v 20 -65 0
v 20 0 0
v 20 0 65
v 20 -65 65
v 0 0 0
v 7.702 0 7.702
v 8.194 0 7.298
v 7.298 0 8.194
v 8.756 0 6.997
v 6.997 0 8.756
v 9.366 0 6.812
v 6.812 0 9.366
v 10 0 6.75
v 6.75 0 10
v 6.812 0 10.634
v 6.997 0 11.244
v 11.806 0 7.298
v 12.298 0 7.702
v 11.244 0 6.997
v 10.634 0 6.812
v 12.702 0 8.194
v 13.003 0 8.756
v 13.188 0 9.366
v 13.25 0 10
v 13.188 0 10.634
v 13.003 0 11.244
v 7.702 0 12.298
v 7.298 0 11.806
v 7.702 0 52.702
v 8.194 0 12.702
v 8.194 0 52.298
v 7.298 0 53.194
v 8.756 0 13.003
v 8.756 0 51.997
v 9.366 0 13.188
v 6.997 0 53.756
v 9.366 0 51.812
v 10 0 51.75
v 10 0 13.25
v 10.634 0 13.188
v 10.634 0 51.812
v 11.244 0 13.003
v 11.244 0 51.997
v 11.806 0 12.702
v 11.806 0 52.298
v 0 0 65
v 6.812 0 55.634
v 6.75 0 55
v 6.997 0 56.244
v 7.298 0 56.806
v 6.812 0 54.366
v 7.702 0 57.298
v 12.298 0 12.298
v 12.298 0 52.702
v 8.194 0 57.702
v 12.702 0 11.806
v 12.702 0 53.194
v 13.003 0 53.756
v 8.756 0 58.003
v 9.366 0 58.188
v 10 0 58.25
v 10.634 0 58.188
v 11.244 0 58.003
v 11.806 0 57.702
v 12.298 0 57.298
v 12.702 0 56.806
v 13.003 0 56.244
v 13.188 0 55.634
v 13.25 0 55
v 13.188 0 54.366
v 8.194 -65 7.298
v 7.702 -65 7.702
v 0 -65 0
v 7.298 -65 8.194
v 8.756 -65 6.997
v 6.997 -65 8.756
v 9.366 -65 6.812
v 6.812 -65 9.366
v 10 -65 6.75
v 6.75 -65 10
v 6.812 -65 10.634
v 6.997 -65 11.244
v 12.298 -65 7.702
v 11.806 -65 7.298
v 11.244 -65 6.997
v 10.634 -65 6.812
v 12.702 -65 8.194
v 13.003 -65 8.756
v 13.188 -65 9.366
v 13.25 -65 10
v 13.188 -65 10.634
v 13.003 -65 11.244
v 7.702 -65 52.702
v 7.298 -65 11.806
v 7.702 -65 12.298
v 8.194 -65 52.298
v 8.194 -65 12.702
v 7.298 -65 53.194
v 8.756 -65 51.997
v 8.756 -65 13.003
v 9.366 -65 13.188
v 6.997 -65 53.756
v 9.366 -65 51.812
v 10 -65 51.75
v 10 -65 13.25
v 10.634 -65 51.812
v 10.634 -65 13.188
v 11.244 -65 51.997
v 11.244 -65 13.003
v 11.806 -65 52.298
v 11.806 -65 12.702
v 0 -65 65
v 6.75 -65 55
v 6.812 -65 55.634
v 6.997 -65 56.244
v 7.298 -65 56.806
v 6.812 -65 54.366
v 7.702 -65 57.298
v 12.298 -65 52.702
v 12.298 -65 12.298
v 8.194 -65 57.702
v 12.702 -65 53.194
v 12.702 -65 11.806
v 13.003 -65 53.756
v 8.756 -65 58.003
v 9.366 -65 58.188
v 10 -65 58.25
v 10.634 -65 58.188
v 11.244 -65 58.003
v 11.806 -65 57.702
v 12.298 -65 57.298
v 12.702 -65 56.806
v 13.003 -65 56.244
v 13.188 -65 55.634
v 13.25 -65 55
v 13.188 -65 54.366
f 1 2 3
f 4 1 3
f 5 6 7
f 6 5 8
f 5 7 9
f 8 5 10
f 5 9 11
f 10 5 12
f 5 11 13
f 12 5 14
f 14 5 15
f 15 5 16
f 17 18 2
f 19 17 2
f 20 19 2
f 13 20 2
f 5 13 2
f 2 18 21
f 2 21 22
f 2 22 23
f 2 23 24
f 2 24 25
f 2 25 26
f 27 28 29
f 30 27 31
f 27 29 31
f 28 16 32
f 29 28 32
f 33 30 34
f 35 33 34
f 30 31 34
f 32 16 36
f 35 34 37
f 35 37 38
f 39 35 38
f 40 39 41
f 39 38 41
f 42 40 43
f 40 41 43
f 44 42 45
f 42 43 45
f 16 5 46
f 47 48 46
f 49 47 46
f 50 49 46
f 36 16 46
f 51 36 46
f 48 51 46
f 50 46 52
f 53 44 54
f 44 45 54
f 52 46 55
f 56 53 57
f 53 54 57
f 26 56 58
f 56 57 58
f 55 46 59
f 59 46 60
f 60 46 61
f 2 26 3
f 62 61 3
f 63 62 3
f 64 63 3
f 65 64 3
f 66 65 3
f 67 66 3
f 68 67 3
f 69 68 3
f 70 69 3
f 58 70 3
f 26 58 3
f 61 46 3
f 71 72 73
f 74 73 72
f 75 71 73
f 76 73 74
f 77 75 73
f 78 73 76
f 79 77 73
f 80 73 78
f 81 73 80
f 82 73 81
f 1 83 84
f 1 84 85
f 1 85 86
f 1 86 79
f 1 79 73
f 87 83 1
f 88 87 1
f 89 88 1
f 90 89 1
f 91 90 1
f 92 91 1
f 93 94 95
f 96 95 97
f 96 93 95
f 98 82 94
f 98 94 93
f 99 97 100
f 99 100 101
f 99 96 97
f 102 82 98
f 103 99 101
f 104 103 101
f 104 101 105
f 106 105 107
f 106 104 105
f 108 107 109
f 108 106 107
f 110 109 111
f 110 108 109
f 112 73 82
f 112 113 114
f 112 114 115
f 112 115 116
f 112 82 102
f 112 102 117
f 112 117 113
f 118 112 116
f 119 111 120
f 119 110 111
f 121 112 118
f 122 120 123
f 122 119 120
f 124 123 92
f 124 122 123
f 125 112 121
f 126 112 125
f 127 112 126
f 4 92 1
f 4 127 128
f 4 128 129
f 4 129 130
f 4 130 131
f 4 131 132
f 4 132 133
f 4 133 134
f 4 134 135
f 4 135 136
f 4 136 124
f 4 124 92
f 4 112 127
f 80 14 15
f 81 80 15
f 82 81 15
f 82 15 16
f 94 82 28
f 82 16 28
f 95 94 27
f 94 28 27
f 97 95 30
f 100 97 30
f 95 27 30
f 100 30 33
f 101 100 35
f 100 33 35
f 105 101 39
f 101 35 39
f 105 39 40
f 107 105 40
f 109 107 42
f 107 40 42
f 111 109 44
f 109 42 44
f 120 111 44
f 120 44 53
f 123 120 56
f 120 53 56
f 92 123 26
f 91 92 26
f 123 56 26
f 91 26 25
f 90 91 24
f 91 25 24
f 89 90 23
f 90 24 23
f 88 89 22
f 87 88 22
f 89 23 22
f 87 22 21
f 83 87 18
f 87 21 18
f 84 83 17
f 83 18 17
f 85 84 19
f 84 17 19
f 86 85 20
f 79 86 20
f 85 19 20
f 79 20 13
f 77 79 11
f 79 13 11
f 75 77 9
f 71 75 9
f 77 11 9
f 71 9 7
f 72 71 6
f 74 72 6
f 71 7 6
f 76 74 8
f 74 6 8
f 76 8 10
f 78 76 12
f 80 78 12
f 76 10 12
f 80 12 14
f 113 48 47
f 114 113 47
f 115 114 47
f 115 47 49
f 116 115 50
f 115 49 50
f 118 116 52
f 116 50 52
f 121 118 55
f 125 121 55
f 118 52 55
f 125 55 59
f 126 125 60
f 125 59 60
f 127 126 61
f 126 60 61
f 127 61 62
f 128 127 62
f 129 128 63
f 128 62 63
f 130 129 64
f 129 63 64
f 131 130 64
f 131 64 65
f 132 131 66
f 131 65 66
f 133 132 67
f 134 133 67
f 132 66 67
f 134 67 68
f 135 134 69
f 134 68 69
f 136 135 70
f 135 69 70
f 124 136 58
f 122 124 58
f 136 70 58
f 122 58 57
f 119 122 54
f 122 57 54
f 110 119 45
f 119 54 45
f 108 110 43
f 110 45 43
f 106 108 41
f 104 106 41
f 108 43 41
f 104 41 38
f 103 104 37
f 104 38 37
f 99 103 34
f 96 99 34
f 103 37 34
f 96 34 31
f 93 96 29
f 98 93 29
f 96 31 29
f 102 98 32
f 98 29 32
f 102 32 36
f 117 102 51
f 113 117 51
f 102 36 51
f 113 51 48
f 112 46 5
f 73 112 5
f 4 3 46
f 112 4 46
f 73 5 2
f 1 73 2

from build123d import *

# Parameters (mm, degrees)
F1_DEPTH = 65


# Not quite as in the source:
# - a feature names something its author has since deleted; it is built from what else it names


with BuildPart() as f1:
    # F0 (on Front) → F1 (new body)
    with BuildSketch(Plane.XZ):
        Polygon((0, 10), (0, 0), (20, 0), (20, 65), (0, 65), (0, 55), align=None)
        with BuildLine():
            ThreePointArc((13.25, 10), (10, 6.75), (6.75, 10))
            ThreePointArc((6.75, 10), (10, 13.25), (13.25, 10))
        make_face(mode=Mode.SUBTRACT)
        with BuildLine():
            ThreePointArc((13.25, 55), (10, 51.75), (6.75, 55))
            ThreePointArc((6.75, 55), (10, 58.25), (13.25, 55))
        make_face(mode=Mode.SUBTRACT)
    extrude(amount=F1_DEPTH)


solid = f1.part
